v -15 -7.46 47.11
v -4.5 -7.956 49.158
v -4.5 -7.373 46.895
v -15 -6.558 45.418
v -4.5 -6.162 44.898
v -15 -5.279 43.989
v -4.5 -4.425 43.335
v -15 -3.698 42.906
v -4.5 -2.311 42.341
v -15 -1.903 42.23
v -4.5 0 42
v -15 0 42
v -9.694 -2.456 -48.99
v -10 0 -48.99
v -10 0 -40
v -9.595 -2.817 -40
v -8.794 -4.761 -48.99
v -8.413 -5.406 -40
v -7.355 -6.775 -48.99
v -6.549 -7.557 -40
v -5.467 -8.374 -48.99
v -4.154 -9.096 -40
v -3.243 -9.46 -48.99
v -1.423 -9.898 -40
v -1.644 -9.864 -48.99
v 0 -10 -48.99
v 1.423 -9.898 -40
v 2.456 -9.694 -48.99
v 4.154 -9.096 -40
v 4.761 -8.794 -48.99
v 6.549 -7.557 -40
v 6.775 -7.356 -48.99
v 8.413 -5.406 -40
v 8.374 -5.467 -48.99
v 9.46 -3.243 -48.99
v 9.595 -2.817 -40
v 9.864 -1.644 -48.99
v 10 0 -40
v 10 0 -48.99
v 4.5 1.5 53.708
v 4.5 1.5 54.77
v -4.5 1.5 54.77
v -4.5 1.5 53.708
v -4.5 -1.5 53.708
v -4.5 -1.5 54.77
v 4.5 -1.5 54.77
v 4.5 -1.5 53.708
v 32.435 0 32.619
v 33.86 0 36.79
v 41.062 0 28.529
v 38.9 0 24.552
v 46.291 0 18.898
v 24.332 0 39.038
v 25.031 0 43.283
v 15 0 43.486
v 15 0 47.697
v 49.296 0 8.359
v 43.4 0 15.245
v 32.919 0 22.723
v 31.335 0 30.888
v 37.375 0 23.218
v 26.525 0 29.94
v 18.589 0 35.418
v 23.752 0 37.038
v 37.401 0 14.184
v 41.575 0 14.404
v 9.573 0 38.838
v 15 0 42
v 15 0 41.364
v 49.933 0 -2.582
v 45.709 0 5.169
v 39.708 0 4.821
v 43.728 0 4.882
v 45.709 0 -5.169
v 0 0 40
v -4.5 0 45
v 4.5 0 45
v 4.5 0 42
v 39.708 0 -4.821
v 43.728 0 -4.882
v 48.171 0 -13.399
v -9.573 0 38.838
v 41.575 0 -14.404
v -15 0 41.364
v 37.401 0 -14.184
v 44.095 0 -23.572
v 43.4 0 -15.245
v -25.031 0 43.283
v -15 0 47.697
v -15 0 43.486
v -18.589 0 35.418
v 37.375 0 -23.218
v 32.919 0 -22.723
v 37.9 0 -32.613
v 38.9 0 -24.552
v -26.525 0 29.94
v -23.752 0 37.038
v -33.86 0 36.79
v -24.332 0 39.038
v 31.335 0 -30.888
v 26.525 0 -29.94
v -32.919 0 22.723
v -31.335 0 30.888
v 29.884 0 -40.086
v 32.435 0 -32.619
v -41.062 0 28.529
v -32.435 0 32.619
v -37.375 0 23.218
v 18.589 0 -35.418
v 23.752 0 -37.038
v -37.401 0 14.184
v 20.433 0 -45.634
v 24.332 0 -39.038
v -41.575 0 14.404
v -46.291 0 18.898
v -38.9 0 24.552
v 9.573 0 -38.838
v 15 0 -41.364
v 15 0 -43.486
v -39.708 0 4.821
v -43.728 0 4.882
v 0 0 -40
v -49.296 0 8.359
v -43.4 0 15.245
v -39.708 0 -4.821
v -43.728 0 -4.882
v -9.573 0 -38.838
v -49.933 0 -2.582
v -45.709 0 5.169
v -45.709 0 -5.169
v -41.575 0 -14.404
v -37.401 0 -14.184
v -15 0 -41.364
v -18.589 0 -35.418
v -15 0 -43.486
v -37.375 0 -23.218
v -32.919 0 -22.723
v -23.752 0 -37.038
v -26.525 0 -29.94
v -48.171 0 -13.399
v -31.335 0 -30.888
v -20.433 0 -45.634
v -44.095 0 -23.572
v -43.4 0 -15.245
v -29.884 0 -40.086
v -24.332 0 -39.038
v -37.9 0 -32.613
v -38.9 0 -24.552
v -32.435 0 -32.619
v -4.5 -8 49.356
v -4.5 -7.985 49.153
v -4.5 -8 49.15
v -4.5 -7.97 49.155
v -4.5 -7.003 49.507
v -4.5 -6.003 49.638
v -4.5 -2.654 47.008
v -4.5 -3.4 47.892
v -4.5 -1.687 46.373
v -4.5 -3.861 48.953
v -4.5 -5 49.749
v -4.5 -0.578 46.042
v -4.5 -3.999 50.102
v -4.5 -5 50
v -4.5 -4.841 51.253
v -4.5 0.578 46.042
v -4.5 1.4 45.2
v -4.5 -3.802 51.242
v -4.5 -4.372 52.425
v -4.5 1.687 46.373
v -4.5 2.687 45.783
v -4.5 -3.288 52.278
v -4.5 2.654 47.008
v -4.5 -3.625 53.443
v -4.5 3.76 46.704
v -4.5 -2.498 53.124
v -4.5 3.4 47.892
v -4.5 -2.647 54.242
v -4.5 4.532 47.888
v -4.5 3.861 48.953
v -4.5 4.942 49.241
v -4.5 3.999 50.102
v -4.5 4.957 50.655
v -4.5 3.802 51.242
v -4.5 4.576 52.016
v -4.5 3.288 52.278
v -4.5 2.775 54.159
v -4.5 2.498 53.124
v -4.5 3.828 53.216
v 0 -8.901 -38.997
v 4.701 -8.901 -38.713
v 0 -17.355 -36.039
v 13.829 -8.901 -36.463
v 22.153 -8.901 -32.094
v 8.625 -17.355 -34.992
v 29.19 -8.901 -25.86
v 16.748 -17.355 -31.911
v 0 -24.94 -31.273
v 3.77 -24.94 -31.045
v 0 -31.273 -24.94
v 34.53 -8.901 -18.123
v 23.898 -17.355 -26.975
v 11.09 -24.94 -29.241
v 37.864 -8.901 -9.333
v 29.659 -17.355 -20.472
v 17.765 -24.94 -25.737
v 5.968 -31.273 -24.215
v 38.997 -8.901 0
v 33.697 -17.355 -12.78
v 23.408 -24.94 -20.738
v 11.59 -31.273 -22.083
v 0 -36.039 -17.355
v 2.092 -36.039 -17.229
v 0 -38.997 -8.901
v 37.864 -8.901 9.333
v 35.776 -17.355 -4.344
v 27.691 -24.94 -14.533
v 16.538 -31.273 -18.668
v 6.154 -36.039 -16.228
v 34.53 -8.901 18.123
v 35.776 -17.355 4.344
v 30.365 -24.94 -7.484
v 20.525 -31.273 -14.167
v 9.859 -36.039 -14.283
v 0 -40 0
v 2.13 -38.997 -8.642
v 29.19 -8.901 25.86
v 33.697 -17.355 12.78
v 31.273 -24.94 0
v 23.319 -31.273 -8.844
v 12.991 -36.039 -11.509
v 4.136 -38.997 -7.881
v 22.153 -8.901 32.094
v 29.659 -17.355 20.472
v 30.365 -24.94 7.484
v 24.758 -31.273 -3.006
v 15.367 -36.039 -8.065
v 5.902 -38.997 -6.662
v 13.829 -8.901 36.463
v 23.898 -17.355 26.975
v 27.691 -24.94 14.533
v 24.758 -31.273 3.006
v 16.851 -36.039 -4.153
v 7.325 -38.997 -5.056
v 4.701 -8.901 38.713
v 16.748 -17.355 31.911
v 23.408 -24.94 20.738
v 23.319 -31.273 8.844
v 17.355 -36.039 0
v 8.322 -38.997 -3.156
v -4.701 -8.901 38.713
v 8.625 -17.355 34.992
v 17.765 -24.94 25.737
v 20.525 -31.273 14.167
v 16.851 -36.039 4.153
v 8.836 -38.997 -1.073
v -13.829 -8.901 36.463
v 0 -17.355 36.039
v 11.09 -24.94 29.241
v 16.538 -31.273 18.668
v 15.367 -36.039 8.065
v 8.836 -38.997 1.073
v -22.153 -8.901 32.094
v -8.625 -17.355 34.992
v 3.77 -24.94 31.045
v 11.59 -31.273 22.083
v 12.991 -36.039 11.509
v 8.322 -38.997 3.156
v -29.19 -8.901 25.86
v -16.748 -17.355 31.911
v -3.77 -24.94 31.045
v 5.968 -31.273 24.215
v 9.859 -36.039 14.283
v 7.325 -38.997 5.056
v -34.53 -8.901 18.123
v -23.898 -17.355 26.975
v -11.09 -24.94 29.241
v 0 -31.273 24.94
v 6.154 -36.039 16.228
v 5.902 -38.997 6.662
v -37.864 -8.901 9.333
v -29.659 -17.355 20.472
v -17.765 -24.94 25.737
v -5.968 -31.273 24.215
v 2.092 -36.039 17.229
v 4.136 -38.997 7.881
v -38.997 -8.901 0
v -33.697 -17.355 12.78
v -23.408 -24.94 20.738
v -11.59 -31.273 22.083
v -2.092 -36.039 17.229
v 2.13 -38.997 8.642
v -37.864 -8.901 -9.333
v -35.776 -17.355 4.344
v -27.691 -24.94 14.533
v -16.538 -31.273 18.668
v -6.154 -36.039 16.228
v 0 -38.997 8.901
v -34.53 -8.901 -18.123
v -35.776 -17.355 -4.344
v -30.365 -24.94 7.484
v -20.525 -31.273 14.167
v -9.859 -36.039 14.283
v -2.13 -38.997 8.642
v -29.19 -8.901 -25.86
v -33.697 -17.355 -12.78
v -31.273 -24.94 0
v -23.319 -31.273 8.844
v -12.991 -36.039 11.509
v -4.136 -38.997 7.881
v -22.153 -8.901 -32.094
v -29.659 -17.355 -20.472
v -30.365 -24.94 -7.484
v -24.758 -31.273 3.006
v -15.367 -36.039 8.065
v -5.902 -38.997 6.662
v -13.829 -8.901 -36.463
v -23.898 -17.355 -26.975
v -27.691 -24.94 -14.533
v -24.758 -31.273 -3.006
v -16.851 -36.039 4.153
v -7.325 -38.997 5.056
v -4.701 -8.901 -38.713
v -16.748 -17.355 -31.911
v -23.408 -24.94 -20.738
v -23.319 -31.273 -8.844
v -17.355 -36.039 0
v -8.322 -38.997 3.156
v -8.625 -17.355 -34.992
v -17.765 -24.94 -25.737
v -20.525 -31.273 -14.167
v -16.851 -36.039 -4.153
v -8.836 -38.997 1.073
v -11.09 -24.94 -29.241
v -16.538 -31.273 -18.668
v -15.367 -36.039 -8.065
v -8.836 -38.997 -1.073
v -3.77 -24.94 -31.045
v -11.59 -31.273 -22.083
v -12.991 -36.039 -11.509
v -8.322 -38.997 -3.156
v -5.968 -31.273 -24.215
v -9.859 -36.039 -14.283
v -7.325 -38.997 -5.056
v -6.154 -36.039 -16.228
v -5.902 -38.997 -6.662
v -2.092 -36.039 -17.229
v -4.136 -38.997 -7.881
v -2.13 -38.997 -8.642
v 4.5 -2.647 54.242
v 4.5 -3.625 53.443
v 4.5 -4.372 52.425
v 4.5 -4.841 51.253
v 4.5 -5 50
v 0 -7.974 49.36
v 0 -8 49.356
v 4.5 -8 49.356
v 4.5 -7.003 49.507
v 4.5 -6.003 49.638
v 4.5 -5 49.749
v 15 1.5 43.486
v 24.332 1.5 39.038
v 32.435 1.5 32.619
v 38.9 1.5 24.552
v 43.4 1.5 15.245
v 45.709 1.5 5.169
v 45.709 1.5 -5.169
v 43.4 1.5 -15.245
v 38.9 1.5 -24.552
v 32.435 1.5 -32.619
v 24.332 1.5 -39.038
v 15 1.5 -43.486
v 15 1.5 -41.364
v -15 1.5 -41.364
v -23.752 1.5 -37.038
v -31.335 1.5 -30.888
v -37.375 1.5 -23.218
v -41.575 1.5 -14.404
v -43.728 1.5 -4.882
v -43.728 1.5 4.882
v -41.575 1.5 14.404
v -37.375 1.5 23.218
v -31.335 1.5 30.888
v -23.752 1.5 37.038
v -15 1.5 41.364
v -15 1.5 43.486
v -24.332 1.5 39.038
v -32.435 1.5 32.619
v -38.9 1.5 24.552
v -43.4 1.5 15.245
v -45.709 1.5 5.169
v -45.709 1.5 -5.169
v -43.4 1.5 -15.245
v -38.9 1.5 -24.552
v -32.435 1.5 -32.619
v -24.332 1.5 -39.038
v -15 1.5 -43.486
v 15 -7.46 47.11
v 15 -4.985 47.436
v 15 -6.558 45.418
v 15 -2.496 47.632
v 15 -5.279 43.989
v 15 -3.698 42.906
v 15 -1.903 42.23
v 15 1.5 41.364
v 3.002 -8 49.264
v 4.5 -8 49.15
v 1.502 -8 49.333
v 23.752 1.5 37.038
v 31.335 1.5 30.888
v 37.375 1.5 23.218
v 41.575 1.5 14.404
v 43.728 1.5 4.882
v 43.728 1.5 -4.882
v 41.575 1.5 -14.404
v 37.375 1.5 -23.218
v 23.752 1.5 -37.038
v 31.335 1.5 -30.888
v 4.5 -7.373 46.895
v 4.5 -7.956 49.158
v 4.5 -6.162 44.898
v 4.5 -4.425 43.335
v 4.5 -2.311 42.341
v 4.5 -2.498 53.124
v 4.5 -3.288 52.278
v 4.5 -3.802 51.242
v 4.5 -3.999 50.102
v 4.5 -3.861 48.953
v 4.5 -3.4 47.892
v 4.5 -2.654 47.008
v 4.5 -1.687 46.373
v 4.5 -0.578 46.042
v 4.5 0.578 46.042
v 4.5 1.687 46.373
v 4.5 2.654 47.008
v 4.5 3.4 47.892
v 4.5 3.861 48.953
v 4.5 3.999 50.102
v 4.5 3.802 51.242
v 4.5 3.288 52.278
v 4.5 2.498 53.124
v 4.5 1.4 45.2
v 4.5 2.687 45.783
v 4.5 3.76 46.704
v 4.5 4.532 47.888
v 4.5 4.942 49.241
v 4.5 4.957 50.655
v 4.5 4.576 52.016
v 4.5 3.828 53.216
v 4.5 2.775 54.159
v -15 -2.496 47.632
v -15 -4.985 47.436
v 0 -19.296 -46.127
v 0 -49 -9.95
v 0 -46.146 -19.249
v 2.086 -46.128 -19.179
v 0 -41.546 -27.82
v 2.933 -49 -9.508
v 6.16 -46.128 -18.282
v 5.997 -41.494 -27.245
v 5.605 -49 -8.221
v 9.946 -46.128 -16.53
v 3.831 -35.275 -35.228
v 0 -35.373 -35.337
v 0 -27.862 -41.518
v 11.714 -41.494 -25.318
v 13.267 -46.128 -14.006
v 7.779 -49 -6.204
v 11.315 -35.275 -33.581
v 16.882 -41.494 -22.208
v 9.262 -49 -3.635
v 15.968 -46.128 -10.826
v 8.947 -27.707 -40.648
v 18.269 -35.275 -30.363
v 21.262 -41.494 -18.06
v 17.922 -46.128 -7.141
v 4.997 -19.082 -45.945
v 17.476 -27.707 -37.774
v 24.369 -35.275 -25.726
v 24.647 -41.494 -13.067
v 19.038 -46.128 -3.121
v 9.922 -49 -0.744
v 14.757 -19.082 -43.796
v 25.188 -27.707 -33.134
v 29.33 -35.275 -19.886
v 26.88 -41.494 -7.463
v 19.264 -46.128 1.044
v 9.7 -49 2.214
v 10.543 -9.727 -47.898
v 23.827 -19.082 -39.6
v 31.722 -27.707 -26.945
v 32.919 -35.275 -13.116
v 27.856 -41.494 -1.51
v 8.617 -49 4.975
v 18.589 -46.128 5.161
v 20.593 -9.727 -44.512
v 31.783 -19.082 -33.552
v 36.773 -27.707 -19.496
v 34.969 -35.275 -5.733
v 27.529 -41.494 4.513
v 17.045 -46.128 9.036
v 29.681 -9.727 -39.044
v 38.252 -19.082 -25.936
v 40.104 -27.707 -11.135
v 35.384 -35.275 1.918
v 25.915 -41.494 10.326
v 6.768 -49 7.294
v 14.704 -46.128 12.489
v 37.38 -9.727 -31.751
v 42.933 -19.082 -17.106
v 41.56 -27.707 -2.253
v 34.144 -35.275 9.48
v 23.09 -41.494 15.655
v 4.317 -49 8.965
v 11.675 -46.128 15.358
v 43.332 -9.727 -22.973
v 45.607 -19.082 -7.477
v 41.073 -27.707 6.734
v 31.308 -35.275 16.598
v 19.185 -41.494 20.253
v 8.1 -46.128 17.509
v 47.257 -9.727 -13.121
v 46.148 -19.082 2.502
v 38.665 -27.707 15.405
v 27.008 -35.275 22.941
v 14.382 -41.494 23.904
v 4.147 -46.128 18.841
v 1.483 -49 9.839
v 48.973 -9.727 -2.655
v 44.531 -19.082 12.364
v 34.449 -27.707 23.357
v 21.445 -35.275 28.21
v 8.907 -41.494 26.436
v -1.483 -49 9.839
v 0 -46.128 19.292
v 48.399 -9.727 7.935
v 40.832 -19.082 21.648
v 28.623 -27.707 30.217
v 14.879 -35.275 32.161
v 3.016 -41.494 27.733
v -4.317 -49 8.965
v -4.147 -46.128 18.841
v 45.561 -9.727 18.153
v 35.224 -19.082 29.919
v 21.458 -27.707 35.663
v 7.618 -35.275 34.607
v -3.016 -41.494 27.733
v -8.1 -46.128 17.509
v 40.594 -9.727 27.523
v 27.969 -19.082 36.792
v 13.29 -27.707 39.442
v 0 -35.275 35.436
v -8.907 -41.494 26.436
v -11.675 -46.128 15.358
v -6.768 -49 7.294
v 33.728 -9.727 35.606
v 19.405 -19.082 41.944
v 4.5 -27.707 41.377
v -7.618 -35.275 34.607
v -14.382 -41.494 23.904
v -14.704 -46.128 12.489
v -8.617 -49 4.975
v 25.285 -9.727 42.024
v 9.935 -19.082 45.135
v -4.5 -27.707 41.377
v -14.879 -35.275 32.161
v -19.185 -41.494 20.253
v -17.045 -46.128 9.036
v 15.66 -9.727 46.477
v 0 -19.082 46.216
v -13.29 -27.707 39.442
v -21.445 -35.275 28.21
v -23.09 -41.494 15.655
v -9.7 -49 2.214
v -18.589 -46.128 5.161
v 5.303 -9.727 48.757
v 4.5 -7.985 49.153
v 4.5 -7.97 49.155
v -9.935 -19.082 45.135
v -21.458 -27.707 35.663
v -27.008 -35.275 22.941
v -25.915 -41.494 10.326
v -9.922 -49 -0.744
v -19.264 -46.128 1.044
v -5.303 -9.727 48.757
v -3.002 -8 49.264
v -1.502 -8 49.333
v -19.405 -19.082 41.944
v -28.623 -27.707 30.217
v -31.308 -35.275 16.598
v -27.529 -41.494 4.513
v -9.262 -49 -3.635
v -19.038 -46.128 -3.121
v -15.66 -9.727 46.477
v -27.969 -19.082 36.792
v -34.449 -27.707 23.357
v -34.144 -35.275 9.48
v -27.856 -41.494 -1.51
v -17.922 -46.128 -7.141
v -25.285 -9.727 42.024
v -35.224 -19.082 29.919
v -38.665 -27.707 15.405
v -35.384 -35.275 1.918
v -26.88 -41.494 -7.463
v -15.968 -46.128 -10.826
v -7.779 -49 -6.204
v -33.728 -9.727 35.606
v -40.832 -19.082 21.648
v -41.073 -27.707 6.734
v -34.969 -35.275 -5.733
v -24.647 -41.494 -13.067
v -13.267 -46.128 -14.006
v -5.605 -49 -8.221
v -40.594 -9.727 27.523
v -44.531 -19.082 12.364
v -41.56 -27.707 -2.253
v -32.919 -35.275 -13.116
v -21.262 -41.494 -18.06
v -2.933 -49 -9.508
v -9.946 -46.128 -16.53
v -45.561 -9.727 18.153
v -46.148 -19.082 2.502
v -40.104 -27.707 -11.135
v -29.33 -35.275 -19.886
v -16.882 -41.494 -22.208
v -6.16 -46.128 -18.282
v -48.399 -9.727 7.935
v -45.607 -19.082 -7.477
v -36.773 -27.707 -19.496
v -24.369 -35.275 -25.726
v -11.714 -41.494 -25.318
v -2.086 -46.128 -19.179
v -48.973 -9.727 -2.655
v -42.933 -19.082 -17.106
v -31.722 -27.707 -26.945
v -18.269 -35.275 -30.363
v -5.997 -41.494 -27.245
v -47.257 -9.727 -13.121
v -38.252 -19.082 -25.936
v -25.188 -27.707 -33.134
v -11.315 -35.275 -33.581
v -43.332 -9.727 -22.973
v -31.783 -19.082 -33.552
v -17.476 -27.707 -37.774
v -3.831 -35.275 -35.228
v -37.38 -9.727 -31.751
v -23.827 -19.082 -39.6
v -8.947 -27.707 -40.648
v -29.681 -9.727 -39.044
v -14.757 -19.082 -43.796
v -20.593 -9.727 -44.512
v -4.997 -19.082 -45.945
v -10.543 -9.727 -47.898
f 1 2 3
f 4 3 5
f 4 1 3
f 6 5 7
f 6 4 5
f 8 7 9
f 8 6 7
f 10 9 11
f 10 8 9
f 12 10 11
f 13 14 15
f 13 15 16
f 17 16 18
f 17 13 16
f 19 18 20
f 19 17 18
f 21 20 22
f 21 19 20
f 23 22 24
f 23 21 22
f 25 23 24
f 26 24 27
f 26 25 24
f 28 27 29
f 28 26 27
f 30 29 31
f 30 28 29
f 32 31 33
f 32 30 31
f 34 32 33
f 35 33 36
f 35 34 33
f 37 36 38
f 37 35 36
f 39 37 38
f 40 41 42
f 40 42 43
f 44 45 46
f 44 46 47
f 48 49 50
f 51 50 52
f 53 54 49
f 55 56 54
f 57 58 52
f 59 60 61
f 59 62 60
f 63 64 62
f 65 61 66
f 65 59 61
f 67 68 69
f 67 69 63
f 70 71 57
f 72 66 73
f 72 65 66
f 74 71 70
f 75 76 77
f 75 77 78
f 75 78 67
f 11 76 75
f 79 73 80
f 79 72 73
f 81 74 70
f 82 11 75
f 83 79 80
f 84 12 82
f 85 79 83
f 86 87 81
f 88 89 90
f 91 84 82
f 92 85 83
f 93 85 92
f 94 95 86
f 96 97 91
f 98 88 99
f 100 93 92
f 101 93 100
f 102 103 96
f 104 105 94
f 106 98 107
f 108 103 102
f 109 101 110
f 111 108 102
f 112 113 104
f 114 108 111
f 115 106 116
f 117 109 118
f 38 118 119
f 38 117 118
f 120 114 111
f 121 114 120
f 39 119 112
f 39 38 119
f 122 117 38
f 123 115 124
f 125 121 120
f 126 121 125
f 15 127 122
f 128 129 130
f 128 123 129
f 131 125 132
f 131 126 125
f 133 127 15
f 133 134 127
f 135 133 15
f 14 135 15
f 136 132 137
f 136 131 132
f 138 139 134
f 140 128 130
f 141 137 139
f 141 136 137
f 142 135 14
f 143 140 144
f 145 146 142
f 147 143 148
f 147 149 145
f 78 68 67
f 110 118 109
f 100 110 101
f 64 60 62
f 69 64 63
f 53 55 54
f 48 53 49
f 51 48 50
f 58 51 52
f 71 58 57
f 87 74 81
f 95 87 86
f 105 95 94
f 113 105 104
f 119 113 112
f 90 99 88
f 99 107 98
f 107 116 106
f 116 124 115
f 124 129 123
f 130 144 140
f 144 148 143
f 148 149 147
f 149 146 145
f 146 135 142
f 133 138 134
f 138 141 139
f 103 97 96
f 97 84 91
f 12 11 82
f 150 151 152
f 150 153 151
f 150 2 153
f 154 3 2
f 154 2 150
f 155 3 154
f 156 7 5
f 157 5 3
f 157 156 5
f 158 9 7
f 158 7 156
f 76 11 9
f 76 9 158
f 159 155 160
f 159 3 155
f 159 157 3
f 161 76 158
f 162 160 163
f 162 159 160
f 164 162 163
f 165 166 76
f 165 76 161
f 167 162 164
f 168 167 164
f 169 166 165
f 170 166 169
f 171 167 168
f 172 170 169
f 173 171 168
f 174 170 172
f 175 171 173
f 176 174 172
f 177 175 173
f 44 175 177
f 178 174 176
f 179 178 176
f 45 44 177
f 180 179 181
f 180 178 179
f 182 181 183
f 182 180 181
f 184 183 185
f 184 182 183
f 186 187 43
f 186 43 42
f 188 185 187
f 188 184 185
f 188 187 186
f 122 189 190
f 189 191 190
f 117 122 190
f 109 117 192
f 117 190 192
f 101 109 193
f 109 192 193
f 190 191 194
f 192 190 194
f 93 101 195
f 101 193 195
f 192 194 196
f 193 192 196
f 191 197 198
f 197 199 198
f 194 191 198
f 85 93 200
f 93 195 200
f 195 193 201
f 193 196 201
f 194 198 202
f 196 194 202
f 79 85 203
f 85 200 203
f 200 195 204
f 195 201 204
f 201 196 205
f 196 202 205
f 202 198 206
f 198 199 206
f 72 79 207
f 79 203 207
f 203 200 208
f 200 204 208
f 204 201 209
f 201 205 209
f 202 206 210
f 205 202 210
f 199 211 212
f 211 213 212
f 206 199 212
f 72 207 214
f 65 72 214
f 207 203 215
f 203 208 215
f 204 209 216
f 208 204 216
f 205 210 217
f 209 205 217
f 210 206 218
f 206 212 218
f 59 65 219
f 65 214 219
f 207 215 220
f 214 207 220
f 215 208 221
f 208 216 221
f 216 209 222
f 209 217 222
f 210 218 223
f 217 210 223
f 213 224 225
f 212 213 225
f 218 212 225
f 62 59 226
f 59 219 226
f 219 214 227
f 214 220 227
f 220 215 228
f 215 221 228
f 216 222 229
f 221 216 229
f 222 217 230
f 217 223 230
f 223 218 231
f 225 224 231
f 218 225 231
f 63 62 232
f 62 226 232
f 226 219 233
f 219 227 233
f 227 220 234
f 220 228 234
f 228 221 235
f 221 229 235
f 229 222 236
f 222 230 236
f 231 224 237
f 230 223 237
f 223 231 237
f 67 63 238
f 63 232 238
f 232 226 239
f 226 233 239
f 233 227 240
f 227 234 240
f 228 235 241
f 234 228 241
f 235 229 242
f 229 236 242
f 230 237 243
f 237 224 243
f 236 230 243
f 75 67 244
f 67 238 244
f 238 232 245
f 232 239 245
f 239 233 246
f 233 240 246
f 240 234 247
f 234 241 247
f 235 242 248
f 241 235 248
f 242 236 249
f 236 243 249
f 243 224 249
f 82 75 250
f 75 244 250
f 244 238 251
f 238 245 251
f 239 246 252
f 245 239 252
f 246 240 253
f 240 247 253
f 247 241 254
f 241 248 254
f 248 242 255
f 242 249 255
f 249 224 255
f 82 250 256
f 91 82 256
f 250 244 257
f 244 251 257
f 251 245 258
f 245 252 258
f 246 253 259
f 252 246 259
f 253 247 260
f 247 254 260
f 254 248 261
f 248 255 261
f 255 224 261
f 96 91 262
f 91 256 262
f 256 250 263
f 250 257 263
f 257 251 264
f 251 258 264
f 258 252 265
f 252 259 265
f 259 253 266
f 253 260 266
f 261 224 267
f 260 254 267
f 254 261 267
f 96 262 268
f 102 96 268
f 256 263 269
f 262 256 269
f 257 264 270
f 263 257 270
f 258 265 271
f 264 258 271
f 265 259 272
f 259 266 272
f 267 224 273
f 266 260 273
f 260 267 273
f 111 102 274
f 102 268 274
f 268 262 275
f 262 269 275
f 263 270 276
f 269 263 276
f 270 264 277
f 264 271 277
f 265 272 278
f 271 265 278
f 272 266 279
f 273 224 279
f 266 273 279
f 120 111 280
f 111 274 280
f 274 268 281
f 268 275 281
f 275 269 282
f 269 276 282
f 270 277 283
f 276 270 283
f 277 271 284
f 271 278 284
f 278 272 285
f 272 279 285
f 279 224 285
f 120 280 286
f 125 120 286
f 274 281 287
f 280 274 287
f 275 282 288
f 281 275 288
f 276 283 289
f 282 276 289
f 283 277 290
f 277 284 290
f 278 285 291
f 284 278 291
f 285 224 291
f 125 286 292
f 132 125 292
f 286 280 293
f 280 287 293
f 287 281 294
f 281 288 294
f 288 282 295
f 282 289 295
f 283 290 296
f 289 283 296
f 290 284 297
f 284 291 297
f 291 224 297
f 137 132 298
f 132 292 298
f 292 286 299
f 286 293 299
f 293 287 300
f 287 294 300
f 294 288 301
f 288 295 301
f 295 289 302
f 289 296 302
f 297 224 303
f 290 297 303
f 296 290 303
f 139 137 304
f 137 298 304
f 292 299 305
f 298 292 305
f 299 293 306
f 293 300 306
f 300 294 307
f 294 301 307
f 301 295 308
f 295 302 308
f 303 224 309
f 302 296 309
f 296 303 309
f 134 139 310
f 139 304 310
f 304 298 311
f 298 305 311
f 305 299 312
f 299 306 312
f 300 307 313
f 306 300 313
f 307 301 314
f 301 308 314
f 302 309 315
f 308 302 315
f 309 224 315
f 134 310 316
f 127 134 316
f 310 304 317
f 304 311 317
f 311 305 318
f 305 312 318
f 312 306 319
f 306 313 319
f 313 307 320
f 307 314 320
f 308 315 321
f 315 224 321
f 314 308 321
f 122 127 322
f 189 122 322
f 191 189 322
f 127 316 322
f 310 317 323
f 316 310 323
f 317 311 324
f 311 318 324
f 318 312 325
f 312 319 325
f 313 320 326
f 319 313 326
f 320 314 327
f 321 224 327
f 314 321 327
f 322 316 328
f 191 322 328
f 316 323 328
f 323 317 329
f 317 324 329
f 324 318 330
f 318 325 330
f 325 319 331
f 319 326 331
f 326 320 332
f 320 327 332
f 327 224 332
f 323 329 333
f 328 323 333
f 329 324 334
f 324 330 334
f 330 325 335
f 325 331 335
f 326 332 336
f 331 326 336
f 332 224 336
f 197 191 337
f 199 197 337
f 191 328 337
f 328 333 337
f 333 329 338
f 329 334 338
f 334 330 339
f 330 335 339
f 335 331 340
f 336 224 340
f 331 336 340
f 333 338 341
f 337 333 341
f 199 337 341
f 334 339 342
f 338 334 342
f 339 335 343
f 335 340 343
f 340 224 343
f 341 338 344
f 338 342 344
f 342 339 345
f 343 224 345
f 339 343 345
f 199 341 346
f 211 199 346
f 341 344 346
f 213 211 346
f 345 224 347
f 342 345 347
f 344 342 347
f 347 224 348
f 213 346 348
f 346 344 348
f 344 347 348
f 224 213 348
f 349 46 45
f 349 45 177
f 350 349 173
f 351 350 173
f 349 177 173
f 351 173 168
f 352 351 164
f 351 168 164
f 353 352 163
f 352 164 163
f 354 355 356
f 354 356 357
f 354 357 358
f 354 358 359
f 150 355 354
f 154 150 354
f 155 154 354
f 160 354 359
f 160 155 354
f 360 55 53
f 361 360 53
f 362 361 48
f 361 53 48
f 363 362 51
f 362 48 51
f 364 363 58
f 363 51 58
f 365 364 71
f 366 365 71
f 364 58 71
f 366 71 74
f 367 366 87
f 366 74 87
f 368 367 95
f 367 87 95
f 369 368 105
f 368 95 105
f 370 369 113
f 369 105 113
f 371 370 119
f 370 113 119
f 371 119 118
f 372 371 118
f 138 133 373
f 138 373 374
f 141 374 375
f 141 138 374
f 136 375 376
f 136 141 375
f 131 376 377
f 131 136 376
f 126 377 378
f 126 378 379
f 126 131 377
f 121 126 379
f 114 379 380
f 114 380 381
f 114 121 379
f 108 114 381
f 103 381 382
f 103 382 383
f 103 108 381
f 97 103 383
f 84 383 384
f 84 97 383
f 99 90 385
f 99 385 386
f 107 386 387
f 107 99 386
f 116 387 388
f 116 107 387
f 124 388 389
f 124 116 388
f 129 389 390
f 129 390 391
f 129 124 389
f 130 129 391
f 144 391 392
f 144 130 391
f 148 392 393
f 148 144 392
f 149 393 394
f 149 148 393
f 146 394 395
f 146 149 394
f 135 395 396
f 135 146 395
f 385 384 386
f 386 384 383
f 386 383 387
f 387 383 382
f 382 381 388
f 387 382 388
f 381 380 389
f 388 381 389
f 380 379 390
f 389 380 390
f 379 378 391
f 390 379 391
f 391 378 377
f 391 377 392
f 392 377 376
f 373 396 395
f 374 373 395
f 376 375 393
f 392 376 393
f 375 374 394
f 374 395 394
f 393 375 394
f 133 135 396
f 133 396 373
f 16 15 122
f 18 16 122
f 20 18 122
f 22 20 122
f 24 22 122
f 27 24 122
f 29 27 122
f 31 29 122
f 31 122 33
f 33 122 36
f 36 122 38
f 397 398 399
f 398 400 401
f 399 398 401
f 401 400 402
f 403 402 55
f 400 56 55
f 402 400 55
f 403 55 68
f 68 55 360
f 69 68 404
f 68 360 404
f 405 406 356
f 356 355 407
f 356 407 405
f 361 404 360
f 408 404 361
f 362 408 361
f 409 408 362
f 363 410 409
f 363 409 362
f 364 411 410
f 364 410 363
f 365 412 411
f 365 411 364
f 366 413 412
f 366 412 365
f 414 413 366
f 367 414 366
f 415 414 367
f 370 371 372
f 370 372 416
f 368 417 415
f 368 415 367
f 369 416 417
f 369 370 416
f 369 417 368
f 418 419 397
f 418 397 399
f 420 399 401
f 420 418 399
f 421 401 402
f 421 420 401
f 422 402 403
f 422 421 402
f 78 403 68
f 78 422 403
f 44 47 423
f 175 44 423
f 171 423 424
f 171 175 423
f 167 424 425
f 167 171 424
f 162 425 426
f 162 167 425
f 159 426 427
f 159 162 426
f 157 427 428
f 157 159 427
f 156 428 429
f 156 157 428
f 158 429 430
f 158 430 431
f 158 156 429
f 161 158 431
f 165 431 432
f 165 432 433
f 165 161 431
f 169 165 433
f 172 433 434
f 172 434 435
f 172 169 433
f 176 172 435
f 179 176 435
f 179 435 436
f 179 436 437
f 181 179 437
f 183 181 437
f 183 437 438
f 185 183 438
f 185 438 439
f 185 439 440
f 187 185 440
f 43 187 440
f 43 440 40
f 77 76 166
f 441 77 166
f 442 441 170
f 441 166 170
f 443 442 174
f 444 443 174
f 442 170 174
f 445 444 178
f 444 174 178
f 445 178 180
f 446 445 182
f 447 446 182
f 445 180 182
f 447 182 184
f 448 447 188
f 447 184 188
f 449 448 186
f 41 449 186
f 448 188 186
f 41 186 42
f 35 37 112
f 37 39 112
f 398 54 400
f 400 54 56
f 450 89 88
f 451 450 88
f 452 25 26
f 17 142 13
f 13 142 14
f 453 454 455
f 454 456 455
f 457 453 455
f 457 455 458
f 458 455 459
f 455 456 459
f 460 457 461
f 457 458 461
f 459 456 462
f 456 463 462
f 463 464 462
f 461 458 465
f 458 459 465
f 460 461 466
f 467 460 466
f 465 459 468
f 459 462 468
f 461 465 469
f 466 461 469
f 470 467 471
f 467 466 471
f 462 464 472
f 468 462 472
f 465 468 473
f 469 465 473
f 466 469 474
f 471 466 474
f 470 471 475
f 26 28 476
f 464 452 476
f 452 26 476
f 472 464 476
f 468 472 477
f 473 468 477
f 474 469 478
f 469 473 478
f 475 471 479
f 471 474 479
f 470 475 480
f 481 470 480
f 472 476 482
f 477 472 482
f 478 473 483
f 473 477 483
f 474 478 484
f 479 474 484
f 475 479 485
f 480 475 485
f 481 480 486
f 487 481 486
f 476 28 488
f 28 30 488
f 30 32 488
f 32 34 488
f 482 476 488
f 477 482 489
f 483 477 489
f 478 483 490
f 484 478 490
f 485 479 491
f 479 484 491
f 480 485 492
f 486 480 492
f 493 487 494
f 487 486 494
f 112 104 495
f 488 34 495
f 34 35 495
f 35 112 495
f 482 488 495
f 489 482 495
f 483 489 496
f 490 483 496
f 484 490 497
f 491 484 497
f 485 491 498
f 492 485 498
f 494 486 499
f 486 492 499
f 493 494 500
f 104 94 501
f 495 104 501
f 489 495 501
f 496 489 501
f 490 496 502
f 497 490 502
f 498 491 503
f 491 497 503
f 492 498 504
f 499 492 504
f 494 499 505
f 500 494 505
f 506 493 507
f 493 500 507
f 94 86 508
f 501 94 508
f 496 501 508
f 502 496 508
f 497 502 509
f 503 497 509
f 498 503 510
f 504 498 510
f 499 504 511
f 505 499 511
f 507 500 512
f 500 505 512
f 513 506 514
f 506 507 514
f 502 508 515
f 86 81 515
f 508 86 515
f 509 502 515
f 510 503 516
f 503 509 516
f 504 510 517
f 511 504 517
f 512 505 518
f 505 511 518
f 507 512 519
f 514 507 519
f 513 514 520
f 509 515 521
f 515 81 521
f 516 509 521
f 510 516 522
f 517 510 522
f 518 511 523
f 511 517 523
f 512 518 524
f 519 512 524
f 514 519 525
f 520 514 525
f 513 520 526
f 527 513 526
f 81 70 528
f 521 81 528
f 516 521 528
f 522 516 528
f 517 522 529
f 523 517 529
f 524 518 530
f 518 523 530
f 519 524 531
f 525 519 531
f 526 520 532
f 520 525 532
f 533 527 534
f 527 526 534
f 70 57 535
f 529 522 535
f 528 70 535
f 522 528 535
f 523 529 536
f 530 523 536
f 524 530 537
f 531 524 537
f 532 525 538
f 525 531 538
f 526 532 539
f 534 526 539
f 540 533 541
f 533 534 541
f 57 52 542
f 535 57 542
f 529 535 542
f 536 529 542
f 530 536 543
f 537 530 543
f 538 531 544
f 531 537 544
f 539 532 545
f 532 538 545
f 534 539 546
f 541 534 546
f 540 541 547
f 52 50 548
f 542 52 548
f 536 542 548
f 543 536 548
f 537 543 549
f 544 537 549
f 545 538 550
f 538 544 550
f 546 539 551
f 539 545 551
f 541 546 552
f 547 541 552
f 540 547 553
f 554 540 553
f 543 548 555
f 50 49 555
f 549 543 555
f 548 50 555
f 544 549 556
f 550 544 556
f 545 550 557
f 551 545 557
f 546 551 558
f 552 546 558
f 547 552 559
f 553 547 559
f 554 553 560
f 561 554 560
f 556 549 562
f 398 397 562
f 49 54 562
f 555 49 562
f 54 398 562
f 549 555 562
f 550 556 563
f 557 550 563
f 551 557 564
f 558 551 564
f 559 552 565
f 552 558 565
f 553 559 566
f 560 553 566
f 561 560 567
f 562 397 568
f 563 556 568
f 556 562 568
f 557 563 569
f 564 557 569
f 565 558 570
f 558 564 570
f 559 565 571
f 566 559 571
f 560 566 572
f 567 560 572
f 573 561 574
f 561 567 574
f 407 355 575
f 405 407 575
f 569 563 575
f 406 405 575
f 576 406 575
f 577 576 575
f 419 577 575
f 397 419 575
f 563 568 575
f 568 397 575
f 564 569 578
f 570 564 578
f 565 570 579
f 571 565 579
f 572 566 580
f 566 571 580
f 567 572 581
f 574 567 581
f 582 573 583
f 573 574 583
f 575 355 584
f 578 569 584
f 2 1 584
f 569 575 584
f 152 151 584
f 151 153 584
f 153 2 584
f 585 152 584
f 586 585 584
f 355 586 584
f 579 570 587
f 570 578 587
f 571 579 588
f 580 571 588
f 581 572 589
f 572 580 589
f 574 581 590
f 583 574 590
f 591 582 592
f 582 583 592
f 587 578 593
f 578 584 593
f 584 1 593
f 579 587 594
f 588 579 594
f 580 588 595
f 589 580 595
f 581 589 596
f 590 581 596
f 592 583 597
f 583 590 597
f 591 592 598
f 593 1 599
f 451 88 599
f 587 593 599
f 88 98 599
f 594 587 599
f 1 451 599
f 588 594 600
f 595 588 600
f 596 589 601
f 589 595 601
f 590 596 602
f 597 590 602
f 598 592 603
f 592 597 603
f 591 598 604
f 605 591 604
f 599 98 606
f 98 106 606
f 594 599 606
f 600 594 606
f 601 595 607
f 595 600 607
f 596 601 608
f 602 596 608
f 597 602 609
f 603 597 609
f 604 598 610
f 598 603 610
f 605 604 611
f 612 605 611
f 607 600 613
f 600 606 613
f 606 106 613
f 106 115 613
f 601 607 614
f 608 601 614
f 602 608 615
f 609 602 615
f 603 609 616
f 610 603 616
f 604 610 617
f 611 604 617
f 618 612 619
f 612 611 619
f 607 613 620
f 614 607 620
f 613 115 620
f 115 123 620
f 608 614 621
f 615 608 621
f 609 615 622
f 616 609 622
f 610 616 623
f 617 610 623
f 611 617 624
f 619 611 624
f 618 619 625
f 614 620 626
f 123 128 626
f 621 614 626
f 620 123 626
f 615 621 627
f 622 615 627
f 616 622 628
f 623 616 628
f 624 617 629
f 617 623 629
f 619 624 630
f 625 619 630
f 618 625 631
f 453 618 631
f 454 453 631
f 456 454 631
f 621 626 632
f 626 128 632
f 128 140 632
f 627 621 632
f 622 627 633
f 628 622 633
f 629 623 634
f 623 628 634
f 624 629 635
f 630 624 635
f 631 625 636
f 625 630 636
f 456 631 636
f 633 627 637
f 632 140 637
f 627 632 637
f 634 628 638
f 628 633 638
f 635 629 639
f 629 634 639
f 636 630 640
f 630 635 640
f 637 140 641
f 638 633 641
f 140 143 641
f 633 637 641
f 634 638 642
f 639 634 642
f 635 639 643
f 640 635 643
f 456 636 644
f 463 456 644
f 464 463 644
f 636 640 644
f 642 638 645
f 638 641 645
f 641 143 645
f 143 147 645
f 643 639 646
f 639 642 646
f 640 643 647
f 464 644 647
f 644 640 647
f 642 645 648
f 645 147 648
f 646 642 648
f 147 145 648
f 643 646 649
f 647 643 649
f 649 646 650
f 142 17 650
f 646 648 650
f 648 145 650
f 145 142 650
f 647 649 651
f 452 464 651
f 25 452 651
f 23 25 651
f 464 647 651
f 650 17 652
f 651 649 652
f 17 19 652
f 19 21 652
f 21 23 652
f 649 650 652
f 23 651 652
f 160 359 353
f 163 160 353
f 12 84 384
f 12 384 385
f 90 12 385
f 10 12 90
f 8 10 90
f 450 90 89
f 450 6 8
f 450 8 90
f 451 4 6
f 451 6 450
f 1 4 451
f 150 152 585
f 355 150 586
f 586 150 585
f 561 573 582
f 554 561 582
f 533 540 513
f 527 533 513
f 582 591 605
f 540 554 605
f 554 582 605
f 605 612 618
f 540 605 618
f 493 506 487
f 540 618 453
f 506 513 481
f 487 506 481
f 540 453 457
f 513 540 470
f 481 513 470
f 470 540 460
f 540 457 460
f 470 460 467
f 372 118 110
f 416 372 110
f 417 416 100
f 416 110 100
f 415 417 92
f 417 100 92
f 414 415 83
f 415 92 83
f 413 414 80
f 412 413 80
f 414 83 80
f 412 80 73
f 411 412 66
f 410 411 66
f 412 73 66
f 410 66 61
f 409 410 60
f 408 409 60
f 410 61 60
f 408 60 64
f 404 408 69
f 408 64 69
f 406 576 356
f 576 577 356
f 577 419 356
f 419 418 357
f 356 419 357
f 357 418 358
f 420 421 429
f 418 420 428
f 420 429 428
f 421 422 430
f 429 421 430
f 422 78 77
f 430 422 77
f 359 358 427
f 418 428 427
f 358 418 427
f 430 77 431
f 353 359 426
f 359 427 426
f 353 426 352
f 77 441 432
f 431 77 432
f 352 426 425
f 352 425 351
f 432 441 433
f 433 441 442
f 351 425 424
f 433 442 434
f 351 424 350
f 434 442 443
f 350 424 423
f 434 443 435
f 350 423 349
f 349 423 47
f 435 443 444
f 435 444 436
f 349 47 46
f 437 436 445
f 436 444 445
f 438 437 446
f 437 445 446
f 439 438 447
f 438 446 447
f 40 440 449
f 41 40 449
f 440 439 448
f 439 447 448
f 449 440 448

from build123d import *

# Parameters (mm, degrees)
CUT_EXTRUDE1_DEPTH       = 15
CUT_EXTRUDE1_DEPTH_BACK  = 15
SKETCH2_R                = 8
BOSS_EXTRUDE1_DEPTH      = 4.5
BOSS_EXTRUDE1_DEPTH_BACK = 4.5
SKETCH3_R                = 5
SKETCH3_R_2              = 4
BOSS_EXTRUDE2_DEPTH      = 4.5
BOSS_EXTRUDE2_DEPTH_BACK = 4.5
SKETCH5_R                = 10
CUT_EXTRUDE2_DEPTH       = 10
BOSS_EXTRUDE3_DEPTH      = 1.5
BOSS_EXTRUDE6_DEPTH      = 4.5
BOSS_EXTRUDE6_DEPTH_BACK = 4.5
CUT_EXTRUDE3_DEPTH       = 4.5
CUT_EXTRUDE3_DEPTH_BACK  = 4.5
SKETCH11_W               = 10
SKETCH11_H               = 3
SKETCH12_R               = 10
CUT_EXTRUDE4_DEPTH       = 1


with BuildPart() as part:
    # Sketch1 → Revolve1 (revolve)
    with BuildSketch(Plane(origin=(0, 0, 0), x_dir=(0, 0, -1), z_dir=(1, 0, 0))):
        with BuildLine():
            Line((0, -40), (0, -50))
            ThreePointArc((0, -50), (35.355339059, -35.355339059), (50, 0))
            Line((50, 0), (40, 0))
            ThreePointArc((40, 0), (28.284271247, -28.284271247), (0, -40))
        make_face()
    revolve(axis=Axis((0, 58.068573396, 0), (0, -1, 0)))

    # Sketch2 → Cut-Extrude1 (cut, two sides: drawn at the far end of the back side and taken through both)
    with BuildSketch(Plane(origin=(0, 0, 0), x_dir=(0, 0, -1), z_dir=(1, 0, 0)).offset(-CUT_EXTRUDE1_DEPTH_BACK)):
        with Locations((-50, 0)):
            Circle(SKETCH2_R)
    extrude(amount=CUT_EXTRUDE1_DEPTH + CUT_EXTRUDE1_DEPTH_BACK, mode=Mode.SUBTRACT)



with BuildPart() as body_2:
    # Sketch3 → Boss-Extrude1 (new, two sides: drawn at the far end of the back side and taken through both)
    with BuildSketch(Plane(origin=(0, 0, 0), x_dir=(0, 0, -1), z_dir=(1, 0, 0)).offset(-BOSS_EXTRUDE1_DEPTH_BACK)):
        with Locations((-50, 0)):
            Circle(SKETCH3_R)
        with Locations((-50, 0)):
            Circle(SKETCH3_R_2, mode=Mode.SUBTRACT)
    extrude(amount=BOSS_EXTRUDE1_DEPTH + BOSS_EXTRUDE1_DEPTH_BACK)


with BuildPart() as part_1:
    add(part.part)

    add(body_2.part)  # Boss-Extrude2 merges body 2
    # Sketch4 → Boss-Extrude2 (add, two sides: drawn at the far end of the back side and taken through both)
    with BuildSketch(Plane(origin=(0, 0, 0), x_dir=(0, 0, -1), z_dir=(1, 0, 0)).offset(-BOSS_EXTRUDE2_DEPTH_BACK)):
        with BuildLine():
            Line((-46, 0), (-40, 0))
            Line((-40, 0), (-40, -5))
            Line((-40, -5), (-50, -5))
            Line((-50, -5), (-50, -4))
            ThreePointArc((-50, -4), (-47.171572875, -2.828427125), (-46, 0))
        make_face()
    extrude(amount=BOSS_EXTRUDE2_DEPTH + BOSS_EXTRUDE2_DEPTH_BACK)

    # Sketch5 → Cut-Extrude2 (cut)
    with BuildSketch(Plane.XY.offset(-50)):
        Circle(SKETCH5_R)
    extrude(amount=CUT_EXTRUDE2_DEPTH, mode=Mode.SUBTRACT)

    # Sketch6 → Boss-Extrude3 (add)
    with BuildSketch(Plane(origin=(0, 0, 0), x_dir=(1, 0, 0), z_dir=(0, 1, 0))):
        with BuildLine():
            Line((-15, 43.48562981), (-15, 41.36423576))
            ThreePointArc((-15, 41.36423576), (-44, 0), (-15, -41.36423576))
            Line((-15, -41.36423576), (-15, -43.48562981))
            ThreePointArc((-15, -43.48562981), (-46, 0), (-15, 43.48562981))
        make_face()
        with BuildLine():
            Line((15, 43.48562981), (15, 41.36423576))
            ThreePointArc((15, 41.36423576), (44, 0), (15, -41.36423576))
            Line((15, -41.36423576), (15, -43.48562981))
            ThreePointArc((15, -43.48562981), (46, 0), (15, 43.48562981))
        make_face()
    extrude(amount=BOSS_EXTRUDE3_DEPTH)

    # Sketch10 → Boss-Extrude6 (add, two sides: drawn at the far end of the back side and taken through both)
    with BuildSketch(Plane(origin=(0, 0, 0), x_dir=(0, 0, -1), z_dir=(1, 0, 0)).offset(-BOSS_EXTRUDE6_DEPTH_BACK)):
        with BuildLine():
            Line((-49.749371855, -5), (-40, -5))
            Line((-40, -5), (-40, -8))
            Line((-40, -8), (-49.355850717, -8))
            ThreePointArc((-49.355850717, -8), (-49.57530923, -6.502977374), (-49.749371855, -5))
        make_face()
    extrude(amount=BOSS_EXTRUDE6_DEPTH + BOSS_EXTRUDE6_DEPTH_BACK)

    # Sketch11 → Cut-Extrude3 (cut, two sides: drawn at the far end of the back side and taken through both)
    with BuildSketch(Plane(origin=(0, 0, 0), x_dir=(0, 0, -1), z_dir=(1, 0, 0)).offset(-CUT_EXTRUDE3_DEPTH_BACK)):
        with Locations((-55, 0)):
            Rectangle(SKETCH11_W, SKETCH11_H)
    extrude(amount=CUT_EXTRUDE3_DEPTH + CUT_EXTRUDE3_DEPTH_BACK, mode=Mode.SUBTRACT)

    # Sketch12 → Cut-Extrude4 (cut)
    with BuildSketch(Plane(origin=(0, -50, 0), x_dir=(1, 0, 0), z_dir=(0, 1, 0))):
        Circle(SKETCH12_R)
    extrude(amount=CUT_EXTRUDE4_DEPTH, mode=Mode.SUBTRACT)


solid = part_1.part
